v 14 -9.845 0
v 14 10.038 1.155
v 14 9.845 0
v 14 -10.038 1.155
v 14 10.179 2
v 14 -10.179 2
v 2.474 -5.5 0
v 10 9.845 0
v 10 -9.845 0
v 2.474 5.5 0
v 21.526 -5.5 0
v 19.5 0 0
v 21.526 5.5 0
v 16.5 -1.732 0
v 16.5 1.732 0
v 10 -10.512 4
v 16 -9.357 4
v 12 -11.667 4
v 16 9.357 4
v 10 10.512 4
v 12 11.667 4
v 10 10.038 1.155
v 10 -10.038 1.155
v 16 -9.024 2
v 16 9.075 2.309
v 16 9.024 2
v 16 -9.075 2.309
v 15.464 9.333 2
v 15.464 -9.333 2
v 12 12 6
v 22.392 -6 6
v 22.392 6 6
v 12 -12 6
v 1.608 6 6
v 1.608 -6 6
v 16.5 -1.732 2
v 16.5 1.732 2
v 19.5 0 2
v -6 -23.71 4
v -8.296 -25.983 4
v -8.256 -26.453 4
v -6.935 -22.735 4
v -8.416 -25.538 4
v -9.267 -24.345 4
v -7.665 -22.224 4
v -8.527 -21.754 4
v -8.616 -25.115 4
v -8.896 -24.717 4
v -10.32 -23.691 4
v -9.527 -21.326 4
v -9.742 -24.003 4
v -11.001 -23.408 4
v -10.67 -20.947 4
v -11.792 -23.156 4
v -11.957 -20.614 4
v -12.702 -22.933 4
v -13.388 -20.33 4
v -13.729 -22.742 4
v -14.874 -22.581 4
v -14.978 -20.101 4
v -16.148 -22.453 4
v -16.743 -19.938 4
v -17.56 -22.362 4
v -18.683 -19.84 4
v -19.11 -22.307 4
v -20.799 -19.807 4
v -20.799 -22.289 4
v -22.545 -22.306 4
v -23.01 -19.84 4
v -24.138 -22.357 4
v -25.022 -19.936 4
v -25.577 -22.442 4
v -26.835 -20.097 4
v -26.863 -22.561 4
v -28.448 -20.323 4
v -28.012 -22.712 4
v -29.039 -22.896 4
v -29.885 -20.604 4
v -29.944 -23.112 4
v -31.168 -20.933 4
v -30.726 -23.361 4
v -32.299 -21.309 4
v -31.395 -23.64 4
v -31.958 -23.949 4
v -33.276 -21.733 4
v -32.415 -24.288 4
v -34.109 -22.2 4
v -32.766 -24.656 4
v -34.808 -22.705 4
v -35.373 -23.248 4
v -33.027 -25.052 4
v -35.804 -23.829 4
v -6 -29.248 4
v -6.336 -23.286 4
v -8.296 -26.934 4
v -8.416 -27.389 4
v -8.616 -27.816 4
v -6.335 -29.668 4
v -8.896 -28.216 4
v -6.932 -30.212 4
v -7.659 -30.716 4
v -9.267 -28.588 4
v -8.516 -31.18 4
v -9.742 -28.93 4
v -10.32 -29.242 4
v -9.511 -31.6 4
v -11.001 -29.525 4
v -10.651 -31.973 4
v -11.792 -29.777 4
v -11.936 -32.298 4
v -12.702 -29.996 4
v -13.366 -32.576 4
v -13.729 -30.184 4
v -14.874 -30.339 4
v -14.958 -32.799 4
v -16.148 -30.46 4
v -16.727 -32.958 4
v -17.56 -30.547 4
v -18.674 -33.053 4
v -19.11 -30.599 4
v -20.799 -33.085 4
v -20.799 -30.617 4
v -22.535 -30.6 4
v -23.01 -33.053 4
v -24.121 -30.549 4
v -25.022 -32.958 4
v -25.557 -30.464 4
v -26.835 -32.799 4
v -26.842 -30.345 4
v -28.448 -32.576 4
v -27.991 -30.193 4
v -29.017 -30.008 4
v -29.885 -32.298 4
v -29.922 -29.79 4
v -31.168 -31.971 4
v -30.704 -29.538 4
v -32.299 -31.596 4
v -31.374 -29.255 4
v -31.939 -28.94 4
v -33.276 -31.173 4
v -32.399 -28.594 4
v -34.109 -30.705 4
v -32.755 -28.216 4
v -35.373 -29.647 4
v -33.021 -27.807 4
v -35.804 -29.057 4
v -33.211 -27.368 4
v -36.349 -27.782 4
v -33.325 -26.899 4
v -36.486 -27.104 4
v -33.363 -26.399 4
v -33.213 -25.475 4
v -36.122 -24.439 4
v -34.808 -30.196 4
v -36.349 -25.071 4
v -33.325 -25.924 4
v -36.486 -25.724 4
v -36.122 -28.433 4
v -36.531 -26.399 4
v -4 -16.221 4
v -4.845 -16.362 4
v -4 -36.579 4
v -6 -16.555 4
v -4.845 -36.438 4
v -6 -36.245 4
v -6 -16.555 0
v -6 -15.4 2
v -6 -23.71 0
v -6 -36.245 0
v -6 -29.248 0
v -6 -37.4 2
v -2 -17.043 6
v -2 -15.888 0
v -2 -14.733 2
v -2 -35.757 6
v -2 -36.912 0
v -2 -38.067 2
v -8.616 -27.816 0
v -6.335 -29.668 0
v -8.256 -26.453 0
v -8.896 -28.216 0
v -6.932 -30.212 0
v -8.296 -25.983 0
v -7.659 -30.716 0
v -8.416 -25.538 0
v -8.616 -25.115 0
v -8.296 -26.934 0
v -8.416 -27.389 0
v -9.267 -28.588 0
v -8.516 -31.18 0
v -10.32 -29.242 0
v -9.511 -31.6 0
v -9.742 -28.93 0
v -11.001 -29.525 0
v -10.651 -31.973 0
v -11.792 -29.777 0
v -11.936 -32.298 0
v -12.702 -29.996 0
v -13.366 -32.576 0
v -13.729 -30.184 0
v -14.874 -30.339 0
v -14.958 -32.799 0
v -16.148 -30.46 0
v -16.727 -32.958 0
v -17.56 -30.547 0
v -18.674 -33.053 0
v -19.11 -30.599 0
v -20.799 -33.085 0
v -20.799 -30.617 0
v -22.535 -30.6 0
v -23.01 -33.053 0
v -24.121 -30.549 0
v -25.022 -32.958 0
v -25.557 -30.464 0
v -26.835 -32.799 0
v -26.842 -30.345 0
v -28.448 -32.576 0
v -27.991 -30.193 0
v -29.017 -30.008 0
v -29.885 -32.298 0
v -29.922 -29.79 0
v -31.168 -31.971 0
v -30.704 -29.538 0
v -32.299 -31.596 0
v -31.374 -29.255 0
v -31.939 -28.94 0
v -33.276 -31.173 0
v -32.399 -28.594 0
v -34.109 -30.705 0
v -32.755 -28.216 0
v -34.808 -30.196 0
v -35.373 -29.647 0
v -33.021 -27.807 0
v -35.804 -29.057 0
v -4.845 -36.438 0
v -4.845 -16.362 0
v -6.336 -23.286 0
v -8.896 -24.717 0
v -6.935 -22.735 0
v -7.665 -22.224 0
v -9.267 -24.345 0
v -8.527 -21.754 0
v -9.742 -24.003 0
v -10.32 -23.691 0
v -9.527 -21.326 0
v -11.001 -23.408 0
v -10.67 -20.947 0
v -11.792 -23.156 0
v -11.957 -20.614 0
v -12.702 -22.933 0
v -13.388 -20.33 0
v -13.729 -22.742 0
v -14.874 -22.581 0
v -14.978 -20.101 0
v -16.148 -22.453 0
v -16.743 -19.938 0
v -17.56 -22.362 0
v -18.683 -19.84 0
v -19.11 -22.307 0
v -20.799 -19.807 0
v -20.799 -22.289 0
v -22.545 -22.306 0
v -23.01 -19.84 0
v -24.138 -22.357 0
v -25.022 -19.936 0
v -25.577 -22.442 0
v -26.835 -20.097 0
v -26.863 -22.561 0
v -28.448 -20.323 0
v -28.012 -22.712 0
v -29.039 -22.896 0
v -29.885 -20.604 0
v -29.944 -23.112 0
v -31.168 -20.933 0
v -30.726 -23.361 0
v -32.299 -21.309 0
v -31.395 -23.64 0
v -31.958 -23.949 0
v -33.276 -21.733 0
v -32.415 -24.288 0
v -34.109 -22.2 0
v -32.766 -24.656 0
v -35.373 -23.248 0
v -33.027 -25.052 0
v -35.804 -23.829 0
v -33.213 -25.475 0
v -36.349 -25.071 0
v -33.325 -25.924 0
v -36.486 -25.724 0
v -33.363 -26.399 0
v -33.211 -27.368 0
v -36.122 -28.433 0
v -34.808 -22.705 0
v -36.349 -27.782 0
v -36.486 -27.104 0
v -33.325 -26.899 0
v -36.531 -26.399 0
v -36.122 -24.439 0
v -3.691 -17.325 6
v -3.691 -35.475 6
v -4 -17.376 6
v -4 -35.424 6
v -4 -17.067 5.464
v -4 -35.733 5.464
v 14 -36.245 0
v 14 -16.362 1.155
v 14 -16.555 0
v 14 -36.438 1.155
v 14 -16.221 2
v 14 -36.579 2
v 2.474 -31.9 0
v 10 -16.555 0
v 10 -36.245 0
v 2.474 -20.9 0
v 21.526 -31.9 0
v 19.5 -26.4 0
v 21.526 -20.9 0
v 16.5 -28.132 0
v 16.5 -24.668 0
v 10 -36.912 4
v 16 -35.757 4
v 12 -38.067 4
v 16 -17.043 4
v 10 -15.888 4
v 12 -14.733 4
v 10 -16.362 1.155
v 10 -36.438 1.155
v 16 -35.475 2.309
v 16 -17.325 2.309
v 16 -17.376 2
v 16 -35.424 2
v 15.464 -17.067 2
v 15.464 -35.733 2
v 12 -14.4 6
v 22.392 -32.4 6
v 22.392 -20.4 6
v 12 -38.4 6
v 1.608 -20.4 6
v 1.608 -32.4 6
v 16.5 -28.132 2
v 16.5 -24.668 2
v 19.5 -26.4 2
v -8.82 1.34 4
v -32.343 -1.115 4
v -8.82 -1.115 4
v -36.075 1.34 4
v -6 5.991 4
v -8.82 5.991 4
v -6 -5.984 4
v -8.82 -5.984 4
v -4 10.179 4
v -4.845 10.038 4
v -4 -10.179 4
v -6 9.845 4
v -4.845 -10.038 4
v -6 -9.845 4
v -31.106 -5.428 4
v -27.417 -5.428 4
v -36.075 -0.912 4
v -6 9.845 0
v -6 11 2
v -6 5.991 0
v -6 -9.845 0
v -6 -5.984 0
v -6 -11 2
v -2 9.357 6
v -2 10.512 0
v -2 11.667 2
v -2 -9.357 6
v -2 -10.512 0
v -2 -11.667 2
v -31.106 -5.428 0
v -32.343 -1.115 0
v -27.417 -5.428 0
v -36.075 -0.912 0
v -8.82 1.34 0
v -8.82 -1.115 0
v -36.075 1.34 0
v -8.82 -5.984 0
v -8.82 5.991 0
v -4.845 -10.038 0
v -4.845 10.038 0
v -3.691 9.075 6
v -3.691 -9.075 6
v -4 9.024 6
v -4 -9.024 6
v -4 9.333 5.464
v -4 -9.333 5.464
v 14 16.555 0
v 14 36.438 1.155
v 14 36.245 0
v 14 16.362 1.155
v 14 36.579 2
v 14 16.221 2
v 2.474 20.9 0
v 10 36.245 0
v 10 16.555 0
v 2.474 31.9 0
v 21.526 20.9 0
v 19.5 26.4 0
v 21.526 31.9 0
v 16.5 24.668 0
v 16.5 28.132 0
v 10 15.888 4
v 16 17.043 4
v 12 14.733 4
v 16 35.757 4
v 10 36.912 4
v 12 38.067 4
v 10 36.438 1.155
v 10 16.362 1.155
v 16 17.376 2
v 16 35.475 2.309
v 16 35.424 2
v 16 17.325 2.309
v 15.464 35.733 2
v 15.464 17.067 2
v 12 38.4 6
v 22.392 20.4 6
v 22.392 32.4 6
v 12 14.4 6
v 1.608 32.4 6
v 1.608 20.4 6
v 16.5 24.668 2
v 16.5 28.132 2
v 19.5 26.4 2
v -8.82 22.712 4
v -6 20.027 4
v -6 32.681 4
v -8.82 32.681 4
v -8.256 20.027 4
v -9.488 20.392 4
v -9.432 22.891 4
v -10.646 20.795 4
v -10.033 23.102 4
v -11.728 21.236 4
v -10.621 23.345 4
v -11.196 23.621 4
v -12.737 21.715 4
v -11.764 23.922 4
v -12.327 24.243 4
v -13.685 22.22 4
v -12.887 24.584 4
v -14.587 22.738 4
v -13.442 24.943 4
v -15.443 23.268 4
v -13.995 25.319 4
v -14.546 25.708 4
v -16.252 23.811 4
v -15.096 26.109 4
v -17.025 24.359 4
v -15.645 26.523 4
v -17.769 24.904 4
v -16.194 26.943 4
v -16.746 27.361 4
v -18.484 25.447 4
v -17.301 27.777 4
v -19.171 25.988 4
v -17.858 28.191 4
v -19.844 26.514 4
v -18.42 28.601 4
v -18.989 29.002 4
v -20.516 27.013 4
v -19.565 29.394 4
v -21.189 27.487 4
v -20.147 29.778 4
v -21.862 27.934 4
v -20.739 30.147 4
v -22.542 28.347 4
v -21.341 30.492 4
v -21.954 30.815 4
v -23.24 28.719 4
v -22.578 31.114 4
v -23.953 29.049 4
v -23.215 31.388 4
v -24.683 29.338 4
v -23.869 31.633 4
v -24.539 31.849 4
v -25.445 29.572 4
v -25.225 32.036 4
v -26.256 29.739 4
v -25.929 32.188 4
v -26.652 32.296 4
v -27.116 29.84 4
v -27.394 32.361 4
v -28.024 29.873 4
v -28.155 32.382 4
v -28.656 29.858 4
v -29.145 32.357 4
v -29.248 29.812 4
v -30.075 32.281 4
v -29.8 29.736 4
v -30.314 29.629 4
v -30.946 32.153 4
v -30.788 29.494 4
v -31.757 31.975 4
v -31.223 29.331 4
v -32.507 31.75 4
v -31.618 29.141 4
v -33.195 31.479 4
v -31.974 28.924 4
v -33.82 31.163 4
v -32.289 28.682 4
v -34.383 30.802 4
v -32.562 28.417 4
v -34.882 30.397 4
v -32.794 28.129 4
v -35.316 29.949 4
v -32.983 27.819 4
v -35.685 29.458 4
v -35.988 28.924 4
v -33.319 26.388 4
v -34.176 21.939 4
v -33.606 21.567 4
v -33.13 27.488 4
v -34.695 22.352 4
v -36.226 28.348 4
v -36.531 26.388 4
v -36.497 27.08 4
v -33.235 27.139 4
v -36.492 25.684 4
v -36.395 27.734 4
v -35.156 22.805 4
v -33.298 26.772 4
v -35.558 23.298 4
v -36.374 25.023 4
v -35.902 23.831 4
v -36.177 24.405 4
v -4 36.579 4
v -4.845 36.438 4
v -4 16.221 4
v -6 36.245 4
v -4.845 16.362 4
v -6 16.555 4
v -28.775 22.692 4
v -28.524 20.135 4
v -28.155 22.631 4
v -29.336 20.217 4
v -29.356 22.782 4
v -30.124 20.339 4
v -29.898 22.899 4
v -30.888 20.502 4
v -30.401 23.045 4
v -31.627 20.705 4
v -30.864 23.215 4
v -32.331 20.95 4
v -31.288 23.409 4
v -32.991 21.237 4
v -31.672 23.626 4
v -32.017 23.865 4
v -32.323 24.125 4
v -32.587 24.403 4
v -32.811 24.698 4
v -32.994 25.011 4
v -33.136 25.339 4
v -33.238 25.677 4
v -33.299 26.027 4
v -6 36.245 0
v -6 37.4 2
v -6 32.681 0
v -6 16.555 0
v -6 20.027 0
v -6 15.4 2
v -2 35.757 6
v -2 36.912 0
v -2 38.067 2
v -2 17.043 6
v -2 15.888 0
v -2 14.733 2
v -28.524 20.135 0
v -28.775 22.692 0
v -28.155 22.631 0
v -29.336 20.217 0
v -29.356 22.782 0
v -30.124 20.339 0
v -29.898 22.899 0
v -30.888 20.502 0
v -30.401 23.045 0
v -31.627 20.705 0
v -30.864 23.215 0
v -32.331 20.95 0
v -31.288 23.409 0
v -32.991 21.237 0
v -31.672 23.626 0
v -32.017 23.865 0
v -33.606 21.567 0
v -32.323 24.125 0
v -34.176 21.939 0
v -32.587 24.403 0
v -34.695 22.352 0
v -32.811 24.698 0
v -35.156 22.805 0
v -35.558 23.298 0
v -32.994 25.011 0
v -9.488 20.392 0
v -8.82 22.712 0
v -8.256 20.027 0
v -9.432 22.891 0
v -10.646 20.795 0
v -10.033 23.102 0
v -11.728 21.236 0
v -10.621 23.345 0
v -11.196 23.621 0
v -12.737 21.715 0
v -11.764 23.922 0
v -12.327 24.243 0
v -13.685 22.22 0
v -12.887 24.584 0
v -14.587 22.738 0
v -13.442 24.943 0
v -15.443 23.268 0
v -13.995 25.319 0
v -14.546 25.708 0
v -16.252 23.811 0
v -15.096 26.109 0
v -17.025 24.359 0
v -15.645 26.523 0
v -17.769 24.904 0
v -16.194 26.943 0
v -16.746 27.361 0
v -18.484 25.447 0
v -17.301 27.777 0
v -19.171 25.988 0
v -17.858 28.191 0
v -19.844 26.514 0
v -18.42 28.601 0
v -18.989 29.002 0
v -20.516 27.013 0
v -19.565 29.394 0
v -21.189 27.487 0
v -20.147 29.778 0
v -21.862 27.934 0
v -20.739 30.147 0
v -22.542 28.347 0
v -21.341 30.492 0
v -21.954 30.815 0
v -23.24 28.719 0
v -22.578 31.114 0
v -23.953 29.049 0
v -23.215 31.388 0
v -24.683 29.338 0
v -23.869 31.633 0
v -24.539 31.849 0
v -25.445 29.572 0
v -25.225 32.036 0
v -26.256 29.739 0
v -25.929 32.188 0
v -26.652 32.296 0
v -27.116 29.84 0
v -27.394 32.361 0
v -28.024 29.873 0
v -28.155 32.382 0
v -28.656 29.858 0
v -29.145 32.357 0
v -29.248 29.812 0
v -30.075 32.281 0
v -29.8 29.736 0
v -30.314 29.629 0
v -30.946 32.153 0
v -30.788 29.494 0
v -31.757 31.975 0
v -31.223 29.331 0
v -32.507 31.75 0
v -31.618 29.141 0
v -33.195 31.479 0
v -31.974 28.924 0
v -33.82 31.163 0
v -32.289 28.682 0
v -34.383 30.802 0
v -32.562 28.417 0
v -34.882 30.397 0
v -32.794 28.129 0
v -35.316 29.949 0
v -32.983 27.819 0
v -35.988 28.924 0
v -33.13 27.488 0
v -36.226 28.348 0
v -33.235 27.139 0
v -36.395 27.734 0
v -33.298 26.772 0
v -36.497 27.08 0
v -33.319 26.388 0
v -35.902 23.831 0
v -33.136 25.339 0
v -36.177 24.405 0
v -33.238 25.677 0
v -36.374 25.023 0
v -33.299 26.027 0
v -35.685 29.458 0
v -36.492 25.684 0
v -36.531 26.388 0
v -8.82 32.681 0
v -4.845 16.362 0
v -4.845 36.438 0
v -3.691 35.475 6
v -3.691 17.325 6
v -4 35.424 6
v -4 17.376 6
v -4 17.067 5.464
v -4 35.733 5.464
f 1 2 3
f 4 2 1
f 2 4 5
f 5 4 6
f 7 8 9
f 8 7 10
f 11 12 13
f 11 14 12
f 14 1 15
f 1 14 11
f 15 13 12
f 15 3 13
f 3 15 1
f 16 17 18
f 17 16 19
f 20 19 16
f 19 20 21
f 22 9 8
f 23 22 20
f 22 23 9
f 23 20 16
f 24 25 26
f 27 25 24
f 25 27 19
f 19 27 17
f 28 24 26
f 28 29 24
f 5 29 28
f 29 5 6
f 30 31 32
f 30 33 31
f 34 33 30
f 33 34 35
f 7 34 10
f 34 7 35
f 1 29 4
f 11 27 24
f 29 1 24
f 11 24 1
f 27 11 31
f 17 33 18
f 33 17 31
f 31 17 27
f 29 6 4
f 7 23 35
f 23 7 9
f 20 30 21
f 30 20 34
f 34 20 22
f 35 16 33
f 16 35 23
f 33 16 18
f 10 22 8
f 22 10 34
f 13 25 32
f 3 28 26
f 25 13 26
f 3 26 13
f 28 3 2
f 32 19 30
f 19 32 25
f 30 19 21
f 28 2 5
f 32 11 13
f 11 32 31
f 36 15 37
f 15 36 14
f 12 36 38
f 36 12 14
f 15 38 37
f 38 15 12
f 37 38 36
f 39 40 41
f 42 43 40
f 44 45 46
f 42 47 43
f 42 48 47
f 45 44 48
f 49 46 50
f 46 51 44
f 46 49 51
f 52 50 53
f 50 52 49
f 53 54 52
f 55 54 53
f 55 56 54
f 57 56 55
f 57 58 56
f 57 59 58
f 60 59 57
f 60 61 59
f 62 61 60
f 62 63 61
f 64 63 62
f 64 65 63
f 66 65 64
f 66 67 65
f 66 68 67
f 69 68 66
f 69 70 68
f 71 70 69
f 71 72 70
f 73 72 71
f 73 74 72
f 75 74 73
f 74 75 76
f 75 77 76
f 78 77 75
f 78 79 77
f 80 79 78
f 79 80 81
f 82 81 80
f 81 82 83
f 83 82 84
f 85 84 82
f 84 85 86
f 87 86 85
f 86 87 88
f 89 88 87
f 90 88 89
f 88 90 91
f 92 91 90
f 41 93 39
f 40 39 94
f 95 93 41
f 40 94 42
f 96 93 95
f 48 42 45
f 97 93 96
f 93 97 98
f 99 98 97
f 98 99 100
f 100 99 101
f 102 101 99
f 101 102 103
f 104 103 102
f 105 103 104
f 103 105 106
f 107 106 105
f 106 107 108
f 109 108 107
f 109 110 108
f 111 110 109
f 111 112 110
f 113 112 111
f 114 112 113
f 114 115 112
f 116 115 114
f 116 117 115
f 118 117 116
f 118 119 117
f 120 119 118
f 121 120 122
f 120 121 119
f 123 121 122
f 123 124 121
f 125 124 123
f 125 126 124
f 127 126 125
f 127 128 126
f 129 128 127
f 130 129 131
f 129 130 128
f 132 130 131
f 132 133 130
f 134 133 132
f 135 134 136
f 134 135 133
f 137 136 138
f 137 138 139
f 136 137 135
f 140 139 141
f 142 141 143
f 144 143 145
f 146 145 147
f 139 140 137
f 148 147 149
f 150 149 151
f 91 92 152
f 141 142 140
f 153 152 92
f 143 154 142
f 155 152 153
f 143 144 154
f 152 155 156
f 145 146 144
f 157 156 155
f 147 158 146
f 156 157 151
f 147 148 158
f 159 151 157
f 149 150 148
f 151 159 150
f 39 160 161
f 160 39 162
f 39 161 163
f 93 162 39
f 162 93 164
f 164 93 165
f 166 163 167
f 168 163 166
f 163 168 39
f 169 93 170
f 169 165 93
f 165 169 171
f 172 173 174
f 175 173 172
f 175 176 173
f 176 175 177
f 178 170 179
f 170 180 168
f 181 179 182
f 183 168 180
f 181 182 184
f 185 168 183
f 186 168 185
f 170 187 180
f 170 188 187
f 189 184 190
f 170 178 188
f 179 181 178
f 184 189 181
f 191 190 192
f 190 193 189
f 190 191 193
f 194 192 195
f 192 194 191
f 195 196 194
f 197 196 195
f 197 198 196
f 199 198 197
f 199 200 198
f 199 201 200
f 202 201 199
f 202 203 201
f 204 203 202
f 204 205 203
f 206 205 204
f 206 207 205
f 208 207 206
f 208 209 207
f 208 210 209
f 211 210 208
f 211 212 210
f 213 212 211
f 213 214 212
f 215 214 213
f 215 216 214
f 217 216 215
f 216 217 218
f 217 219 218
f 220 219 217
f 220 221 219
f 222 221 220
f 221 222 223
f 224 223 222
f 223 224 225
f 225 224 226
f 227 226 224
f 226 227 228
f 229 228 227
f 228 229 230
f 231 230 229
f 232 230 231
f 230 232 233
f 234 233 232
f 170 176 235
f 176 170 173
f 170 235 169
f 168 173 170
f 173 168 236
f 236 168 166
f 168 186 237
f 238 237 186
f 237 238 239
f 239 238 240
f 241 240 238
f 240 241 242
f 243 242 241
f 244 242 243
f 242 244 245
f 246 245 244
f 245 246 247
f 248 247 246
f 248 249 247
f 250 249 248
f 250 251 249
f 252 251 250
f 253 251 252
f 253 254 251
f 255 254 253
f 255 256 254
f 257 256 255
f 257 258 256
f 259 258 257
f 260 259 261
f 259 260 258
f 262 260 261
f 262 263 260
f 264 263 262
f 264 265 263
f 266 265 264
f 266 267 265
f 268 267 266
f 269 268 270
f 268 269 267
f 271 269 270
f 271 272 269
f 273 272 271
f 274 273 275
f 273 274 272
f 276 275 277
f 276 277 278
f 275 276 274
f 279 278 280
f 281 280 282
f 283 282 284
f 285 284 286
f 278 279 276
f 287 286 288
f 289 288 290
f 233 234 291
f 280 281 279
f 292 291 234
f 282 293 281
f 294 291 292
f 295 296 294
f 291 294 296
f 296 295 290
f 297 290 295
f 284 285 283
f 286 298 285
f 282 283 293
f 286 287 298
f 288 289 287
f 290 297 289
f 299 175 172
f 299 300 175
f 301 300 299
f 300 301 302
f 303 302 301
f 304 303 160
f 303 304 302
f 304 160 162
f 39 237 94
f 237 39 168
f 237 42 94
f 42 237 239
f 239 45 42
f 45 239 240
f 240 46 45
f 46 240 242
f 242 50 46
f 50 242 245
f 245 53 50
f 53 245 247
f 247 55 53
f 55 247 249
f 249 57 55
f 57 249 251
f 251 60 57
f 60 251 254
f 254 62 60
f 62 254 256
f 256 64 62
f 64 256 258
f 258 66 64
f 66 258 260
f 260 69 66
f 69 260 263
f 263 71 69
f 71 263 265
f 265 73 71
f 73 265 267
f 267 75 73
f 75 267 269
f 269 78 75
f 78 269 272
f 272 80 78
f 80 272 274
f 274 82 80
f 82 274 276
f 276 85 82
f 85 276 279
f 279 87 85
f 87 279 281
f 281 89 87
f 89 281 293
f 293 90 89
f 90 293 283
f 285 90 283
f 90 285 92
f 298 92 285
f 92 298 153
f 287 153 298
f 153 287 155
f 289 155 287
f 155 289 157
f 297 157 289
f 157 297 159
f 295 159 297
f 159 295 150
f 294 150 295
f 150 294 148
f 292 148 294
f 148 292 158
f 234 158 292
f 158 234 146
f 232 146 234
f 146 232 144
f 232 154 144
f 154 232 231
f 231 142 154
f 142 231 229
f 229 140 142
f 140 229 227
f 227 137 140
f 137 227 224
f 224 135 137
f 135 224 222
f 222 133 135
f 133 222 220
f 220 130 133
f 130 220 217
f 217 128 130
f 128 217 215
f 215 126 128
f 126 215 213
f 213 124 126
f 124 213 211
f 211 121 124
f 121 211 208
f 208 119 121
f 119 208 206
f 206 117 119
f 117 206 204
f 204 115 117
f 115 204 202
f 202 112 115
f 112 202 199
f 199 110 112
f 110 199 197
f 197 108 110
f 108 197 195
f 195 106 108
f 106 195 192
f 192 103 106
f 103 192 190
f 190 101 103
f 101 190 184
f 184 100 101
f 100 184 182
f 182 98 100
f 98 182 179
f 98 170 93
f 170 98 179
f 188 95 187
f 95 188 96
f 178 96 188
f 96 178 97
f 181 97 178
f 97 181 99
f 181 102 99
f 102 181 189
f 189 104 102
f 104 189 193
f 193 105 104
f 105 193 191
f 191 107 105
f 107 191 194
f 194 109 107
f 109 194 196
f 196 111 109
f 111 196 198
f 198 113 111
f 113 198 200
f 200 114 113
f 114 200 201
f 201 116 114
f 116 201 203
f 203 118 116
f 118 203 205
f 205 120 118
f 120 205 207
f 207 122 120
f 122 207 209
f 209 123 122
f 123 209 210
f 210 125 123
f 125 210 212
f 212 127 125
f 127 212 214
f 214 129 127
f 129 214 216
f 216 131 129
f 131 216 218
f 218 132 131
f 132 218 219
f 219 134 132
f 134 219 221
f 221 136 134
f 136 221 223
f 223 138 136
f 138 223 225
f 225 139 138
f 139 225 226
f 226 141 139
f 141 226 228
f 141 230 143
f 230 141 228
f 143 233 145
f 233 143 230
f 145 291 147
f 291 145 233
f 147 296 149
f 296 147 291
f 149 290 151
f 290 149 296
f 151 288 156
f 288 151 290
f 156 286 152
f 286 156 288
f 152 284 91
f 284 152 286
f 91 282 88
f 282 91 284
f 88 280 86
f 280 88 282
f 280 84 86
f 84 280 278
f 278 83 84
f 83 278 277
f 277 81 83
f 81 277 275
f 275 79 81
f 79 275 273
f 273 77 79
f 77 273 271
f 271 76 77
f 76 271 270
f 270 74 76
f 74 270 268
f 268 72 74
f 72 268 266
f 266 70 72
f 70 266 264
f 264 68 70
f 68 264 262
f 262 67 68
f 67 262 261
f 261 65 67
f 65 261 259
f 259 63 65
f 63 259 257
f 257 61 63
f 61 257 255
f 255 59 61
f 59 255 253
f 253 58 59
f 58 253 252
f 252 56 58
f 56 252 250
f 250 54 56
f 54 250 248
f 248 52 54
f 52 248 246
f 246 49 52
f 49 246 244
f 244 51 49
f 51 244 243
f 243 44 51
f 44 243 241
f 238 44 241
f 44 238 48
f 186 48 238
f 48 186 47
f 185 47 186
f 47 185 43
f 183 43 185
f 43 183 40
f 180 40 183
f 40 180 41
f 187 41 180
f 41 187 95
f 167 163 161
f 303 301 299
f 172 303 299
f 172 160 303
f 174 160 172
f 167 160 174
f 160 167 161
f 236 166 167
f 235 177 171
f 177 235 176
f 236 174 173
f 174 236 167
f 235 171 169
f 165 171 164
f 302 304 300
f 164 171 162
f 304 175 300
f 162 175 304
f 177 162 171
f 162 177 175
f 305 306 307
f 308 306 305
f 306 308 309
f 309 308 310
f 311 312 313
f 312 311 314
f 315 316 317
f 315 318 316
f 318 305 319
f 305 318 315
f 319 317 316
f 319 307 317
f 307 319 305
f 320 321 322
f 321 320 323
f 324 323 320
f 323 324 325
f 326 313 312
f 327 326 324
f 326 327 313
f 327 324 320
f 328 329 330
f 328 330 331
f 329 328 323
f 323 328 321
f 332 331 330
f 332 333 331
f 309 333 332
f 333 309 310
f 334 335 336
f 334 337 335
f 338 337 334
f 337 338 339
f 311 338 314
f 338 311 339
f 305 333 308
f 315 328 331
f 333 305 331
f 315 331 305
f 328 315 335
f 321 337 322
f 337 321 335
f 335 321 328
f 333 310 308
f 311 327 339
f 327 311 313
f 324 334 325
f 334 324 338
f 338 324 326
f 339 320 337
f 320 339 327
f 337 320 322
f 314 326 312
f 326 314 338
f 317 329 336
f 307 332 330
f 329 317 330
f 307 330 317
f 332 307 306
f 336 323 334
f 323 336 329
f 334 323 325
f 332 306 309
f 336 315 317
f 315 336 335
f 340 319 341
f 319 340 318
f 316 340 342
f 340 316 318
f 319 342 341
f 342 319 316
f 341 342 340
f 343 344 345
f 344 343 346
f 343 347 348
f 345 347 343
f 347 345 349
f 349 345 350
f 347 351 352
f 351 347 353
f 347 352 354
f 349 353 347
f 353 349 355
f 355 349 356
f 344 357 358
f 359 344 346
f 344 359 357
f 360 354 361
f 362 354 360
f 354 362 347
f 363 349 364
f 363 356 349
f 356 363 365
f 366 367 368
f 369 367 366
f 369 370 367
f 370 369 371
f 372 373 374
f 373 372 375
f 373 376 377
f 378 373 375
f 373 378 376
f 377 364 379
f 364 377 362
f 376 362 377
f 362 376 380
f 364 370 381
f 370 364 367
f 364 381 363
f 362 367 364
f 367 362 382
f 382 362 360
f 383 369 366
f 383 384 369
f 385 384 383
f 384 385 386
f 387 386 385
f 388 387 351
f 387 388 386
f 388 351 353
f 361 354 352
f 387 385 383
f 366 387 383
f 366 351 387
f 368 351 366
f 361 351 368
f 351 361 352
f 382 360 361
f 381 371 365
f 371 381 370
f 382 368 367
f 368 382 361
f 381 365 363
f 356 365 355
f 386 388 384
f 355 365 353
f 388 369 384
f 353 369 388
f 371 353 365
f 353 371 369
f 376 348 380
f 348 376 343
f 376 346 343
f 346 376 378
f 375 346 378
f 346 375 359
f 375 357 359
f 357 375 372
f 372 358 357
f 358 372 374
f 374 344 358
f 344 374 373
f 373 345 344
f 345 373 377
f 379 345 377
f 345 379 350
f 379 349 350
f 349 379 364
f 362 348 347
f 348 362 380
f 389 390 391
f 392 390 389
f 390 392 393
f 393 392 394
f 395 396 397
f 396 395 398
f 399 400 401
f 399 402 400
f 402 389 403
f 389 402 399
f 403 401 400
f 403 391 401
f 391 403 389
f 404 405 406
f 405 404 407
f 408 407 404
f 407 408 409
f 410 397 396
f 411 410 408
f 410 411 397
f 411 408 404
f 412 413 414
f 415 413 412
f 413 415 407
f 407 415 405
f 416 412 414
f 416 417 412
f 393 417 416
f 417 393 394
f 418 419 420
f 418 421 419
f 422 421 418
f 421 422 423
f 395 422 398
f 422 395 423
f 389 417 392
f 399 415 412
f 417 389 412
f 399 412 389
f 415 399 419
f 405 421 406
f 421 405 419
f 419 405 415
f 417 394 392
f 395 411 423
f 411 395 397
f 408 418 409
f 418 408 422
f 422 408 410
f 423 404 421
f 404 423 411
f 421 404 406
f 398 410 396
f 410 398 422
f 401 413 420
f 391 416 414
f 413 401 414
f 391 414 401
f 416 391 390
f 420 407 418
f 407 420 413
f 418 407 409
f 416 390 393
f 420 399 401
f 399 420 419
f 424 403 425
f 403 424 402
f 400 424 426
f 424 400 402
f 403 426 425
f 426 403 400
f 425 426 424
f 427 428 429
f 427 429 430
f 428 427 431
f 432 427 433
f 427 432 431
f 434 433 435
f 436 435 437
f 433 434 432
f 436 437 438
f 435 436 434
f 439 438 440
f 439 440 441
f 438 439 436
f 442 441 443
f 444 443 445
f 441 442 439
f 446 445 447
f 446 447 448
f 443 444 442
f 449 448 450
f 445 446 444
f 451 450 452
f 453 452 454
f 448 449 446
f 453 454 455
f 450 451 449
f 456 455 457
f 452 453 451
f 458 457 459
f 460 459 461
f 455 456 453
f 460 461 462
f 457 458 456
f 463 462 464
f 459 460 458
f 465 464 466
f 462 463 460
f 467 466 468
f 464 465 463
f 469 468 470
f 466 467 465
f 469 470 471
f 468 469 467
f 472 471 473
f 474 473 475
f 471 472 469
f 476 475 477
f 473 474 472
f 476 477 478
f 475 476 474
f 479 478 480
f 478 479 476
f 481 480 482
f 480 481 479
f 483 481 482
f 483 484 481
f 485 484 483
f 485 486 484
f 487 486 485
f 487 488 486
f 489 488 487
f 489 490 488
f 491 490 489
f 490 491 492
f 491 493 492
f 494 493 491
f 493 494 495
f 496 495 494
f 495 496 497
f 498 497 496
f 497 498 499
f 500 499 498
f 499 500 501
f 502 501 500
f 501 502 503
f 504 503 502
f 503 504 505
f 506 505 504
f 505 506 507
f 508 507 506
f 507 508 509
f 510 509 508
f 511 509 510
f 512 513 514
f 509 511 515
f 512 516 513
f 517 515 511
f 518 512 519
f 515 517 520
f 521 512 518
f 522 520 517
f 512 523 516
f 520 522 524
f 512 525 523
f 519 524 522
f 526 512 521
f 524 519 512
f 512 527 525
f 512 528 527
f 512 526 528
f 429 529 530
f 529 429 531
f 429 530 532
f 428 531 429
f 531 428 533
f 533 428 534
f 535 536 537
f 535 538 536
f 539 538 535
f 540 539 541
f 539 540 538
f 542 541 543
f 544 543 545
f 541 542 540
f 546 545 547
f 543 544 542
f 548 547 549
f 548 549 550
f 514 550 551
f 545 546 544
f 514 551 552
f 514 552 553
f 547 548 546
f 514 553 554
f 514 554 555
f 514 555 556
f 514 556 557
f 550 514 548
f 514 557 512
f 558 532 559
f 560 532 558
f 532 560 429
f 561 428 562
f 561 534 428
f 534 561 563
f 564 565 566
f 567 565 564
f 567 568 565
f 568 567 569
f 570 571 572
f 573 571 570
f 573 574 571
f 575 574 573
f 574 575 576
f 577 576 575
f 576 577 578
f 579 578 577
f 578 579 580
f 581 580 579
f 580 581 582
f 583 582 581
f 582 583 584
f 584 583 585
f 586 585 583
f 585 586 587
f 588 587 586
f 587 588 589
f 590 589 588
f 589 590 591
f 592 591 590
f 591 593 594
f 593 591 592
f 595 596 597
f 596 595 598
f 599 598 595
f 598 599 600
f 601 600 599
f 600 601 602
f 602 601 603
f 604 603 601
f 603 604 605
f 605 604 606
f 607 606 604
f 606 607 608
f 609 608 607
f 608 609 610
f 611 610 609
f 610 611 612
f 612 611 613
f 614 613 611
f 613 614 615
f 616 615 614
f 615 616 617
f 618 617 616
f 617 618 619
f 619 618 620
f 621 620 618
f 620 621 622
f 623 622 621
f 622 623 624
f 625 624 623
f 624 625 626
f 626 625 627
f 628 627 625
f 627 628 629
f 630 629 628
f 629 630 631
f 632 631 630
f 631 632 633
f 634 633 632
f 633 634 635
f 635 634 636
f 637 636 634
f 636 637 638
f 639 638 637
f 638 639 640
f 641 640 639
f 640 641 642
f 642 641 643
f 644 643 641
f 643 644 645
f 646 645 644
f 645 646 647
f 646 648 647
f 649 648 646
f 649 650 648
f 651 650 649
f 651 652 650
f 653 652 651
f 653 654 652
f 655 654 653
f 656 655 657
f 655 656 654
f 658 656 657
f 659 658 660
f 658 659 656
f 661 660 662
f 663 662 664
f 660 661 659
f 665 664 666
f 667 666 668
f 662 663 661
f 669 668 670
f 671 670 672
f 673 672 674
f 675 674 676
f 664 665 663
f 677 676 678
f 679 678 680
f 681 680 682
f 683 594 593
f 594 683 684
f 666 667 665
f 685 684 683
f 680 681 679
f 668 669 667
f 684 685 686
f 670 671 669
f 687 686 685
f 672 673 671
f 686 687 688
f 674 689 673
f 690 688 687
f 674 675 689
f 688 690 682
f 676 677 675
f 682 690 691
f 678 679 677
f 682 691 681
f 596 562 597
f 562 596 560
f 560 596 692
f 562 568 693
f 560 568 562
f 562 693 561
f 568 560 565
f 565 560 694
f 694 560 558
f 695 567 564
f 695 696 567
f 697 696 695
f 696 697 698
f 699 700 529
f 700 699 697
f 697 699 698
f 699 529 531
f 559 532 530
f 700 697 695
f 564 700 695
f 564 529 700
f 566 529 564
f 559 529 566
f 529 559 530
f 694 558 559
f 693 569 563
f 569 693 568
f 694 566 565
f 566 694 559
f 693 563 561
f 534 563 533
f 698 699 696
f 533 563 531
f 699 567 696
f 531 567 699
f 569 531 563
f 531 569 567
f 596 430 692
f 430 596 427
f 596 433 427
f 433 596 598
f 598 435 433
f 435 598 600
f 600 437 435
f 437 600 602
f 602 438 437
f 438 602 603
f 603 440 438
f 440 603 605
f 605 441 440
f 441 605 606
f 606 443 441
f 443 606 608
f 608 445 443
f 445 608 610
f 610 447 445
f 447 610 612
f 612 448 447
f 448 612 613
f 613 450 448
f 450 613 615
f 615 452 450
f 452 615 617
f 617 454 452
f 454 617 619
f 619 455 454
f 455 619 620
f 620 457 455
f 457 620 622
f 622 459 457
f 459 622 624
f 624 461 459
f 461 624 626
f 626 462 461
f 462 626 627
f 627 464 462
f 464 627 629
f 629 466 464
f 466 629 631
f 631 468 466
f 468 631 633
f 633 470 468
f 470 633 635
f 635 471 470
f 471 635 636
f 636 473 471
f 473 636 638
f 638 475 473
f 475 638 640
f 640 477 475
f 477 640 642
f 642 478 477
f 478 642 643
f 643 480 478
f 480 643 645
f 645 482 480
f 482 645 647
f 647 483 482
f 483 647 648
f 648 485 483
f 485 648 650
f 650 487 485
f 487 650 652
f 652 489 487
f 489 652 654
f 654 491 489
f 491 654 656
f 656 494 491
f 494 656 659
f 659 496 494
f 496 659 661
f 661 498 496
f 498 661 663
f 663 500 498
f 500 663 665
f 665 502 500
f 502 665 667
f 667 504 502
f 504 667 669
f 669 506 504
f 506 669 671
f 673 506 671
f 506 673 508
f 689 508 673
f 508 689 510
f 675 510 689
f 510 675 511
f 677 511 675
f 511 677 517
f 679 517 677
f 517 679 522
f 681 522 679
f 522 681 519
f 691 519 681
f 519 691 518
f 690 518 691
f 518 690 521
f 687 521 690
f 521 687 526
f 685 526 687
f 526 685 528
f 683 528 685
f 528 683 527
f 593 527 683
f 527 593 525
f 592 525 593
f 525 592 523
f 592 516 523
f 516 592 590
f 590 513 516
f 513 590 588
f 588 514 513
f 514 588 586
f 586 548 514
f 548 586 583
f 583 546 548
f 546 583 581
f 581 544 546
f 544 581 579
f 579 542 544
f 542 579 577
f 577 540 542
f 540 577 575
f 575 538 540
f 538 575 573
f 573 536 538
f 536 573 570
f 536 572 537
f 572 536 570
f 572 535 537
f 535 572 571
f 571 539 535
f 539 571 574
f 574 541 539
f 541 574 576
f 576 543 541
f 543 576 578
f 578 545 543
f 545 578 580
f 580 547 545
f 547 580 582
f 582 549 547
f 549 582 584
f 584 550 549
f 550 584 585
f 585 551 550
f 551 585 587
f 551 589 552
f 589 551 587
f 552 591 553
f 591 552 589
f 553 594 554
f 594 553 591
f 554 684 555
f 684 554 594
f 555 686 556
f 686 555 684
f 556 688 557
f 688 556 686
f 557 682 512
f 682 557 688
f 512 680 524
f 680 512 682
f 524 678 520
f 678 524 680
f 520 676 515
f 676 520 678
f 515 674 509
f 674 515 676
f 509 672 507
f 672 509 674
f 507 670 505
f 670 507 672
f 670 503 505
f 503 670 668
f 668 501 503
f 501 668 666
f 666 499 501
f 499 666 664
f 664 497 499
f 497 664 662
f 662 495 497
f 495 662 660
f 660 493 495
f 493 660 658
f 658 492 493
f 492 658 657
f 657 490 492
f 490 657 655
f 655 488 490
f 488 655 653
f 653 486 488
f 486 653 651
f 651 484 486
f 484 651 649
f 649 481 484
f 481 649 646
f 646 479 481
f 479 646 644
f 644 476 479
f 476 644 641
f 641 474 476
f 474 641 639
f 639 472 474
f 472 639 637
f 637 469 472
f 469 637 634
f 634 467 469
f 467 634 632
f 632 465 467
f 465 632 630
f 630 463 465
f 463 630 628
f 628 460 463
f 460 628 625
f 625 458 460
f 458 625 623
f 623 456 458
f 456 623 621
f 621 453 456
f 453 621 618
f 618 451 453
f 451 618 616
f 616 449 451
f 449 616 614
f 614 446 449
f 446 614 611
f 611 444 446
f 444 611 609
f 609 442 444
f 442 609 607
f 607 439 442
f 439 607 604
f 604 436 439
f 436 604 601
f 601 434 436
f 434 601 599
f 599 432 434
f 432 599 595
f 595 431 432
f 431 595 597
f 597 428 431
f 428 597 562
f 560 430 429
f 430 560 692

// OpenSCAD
// file: SingleMiniLibrary.scad
//Constants
sml_BaseCircle = 90;
sml_BaseTriangle = 3;
sml_BaseSquare = 4;
sml_BasePentagon = 5;
sml_BaseHexagon = 6;

//Variables
sml_BaseSideCount = 6;
sml_BaseWidth = 24;
sml_BaseTopOffset = 1;
sml_BaseHeight = 6;

sml_TextThickness = 4;
sml_TextHeightScale = 3.2;
sml_TextWidthScale = 2;
sml_TextCharacter = "0";

sml_CutoutHeight = 4;
sml_CutoutThickness = sml_TextThickness;

sml_Text_Offset_Digit = 7.77;
sml_Text_Offset_1 = 8.1;

//Functions
function getRadiusForTriangle(w) = (w*.577)-.5; //Slightly less than w
function getRadiusForSquare(w) = ((w*1.41)-1)/2;  //Slightly less than w

//Modules
module sml_Base (bsc, bw, bto, bh) {
    difference () {
        //Base
        {
            if (bsc == sml_BaseCircle) {
                rotate([0,0,0])
                    cylinder(h=bh, r1=bw/2, r2=(bw/2)-bto, $fn=bsc);
            }
            else if (bsc == sml_BaseTriangle) {
                rotate([0,0,0])
                    cylinder(h=bh, r1=getRadiusForTriangle(bw), r2=getRadiusForTriangle(bw)-bto, $fn=bsc);
            }
            else if (bsc == sml_BaseSquare) {
                rotate([0,0,45])
                    cylinder(h=bh, r1=getRadiusForSquare(bw), r2=getRadiusForSquare(bw)-bto, $fn=bsc);
            }
            else if (bsc == sml_BasePentagon) {
                rotate([0,0,0])
                    cylinder(h=bh, r1=bw/2, r2=(bw/2)-bto, $fn=bsc);
            }
            else if (bsc == sml_BaseHexagon) {
                rotate([0,0,30])
                    cylinder(h=bh, r1=bw/2, r2=(bw/2)-bto, $fn=bsc);
            }
            else {
                rotate([0,0,0])
                    cylinder(h=bh, r1=bw/2, r2=(bw/2)-bto, $fn=bsc);
            }
        }
        //Facing Indicator
        translate([((bw/2)-bto)*.5,0,bh-2])
            cylinder(h=4, r=2, $fn=3);
    }
}

module sml_BaseInverse (bsc, bw, bto, bh, coh, cot) {
    difference () {
        translate([-(bw+4)/2,-(bw+4)/2,0])
            cube([bw+4,bw+4,bh]);
            sml_Base(bsc, bw, bto, bh);
    }
}

module sml_Cutout (bw, bh, coh, cot) {
    //Cutout
    translate([-cot/2,-(bw+4)/2,bh-(coh)])
        union () {
            cube([cot,bw+4,coh]);
            translate([cot,0,0])
                cube([cot/2,bw+4,cot/2]);
        }
}

module sml_Text(tc, tt, ths, tws, to, bh) {
    translate([-tt/2,-to,bh-.5])
        rotate([90,0,90])
            scale([tws,ths,1])
                linear_extrude (height=tt)
                    text(tc);
} 

module sml_BaseFinal (bsc, bw, bto, bh, coh, cot) {
    difference() {
        sml_Base(bsc, bw, bto, bh);
        sml_Cutout(bw, bh, coh, cot);
    }
}

module sml_TextFinal (bsc, bw, bto, bh, coh, cot, tc, tt, ths, tws, to) {
            difference () {
                    union () {
                        sml_Text(tc, tt, ths, tws, to, bh);        
                        sml_Cutout(bw, bh, coh, cot);
                    }
                    difference () {
                        sml_BaseInverse (bsc, bw, bto, bh, coh, cot);
                        sml_BaseFinal (bsc, bw, bto, bh, coh, cot);
                    }
                }
}

module sml_Mini (bsc, bw, bto, bh, coh, cot, tc, tt, ths, tws, to) {
    translate([0,0,tt/2])
        rotate([0,-90,0])    
            sml_TextFinal(bsc, bw, bto, bh, coh, cot, tc, tt, ths, tws, to);
    translate([0,0,bh])
        rotate([180,0,0])
            translate([bw/2,0,0])
                sml_BaseFinal(bsc, bw, bto, bh, coh, cot);
}
// main file
include <SingleMiniLibrary.scad>; 

translate([0,-sml_BaseWidth*1.1,0])
sml_Mini(sml_BaseSideCount, sml_BaseWidth, sml_BaseTopOffset, sml_BaseHeight, sml_CutoutHeight, sml_CutoutThickness, sml_TextCharacter, sml_TextThickness, sml_TextHeightScale, sml_TextWidthScale, sml_Text_Offset_Digit);

sml_Mini(sml_BaseSideCount, sml_BaseWidth, sml_BaseTopOffset, sml_BaseHeight, sml_CutoutHeight, sml_CutoutThickness, "1", sml_TextThickness, sml_TextHeightScale, sml_TextWidthScale, sml_Text_Offset_1);

translate([0,sml_BaseWidth*1.1,0])
sml_Mini(sml_BaseSideCount, sml_BaseWidth, sml_BaseTopOffset, sml_BaseHeight, sml_CutoutHeight, sml_CutoutThickness, "2", sml_TextThickness, sml_TextHeightScale, sml_TextWidthScale, sml_Text_Offset_Digit);
